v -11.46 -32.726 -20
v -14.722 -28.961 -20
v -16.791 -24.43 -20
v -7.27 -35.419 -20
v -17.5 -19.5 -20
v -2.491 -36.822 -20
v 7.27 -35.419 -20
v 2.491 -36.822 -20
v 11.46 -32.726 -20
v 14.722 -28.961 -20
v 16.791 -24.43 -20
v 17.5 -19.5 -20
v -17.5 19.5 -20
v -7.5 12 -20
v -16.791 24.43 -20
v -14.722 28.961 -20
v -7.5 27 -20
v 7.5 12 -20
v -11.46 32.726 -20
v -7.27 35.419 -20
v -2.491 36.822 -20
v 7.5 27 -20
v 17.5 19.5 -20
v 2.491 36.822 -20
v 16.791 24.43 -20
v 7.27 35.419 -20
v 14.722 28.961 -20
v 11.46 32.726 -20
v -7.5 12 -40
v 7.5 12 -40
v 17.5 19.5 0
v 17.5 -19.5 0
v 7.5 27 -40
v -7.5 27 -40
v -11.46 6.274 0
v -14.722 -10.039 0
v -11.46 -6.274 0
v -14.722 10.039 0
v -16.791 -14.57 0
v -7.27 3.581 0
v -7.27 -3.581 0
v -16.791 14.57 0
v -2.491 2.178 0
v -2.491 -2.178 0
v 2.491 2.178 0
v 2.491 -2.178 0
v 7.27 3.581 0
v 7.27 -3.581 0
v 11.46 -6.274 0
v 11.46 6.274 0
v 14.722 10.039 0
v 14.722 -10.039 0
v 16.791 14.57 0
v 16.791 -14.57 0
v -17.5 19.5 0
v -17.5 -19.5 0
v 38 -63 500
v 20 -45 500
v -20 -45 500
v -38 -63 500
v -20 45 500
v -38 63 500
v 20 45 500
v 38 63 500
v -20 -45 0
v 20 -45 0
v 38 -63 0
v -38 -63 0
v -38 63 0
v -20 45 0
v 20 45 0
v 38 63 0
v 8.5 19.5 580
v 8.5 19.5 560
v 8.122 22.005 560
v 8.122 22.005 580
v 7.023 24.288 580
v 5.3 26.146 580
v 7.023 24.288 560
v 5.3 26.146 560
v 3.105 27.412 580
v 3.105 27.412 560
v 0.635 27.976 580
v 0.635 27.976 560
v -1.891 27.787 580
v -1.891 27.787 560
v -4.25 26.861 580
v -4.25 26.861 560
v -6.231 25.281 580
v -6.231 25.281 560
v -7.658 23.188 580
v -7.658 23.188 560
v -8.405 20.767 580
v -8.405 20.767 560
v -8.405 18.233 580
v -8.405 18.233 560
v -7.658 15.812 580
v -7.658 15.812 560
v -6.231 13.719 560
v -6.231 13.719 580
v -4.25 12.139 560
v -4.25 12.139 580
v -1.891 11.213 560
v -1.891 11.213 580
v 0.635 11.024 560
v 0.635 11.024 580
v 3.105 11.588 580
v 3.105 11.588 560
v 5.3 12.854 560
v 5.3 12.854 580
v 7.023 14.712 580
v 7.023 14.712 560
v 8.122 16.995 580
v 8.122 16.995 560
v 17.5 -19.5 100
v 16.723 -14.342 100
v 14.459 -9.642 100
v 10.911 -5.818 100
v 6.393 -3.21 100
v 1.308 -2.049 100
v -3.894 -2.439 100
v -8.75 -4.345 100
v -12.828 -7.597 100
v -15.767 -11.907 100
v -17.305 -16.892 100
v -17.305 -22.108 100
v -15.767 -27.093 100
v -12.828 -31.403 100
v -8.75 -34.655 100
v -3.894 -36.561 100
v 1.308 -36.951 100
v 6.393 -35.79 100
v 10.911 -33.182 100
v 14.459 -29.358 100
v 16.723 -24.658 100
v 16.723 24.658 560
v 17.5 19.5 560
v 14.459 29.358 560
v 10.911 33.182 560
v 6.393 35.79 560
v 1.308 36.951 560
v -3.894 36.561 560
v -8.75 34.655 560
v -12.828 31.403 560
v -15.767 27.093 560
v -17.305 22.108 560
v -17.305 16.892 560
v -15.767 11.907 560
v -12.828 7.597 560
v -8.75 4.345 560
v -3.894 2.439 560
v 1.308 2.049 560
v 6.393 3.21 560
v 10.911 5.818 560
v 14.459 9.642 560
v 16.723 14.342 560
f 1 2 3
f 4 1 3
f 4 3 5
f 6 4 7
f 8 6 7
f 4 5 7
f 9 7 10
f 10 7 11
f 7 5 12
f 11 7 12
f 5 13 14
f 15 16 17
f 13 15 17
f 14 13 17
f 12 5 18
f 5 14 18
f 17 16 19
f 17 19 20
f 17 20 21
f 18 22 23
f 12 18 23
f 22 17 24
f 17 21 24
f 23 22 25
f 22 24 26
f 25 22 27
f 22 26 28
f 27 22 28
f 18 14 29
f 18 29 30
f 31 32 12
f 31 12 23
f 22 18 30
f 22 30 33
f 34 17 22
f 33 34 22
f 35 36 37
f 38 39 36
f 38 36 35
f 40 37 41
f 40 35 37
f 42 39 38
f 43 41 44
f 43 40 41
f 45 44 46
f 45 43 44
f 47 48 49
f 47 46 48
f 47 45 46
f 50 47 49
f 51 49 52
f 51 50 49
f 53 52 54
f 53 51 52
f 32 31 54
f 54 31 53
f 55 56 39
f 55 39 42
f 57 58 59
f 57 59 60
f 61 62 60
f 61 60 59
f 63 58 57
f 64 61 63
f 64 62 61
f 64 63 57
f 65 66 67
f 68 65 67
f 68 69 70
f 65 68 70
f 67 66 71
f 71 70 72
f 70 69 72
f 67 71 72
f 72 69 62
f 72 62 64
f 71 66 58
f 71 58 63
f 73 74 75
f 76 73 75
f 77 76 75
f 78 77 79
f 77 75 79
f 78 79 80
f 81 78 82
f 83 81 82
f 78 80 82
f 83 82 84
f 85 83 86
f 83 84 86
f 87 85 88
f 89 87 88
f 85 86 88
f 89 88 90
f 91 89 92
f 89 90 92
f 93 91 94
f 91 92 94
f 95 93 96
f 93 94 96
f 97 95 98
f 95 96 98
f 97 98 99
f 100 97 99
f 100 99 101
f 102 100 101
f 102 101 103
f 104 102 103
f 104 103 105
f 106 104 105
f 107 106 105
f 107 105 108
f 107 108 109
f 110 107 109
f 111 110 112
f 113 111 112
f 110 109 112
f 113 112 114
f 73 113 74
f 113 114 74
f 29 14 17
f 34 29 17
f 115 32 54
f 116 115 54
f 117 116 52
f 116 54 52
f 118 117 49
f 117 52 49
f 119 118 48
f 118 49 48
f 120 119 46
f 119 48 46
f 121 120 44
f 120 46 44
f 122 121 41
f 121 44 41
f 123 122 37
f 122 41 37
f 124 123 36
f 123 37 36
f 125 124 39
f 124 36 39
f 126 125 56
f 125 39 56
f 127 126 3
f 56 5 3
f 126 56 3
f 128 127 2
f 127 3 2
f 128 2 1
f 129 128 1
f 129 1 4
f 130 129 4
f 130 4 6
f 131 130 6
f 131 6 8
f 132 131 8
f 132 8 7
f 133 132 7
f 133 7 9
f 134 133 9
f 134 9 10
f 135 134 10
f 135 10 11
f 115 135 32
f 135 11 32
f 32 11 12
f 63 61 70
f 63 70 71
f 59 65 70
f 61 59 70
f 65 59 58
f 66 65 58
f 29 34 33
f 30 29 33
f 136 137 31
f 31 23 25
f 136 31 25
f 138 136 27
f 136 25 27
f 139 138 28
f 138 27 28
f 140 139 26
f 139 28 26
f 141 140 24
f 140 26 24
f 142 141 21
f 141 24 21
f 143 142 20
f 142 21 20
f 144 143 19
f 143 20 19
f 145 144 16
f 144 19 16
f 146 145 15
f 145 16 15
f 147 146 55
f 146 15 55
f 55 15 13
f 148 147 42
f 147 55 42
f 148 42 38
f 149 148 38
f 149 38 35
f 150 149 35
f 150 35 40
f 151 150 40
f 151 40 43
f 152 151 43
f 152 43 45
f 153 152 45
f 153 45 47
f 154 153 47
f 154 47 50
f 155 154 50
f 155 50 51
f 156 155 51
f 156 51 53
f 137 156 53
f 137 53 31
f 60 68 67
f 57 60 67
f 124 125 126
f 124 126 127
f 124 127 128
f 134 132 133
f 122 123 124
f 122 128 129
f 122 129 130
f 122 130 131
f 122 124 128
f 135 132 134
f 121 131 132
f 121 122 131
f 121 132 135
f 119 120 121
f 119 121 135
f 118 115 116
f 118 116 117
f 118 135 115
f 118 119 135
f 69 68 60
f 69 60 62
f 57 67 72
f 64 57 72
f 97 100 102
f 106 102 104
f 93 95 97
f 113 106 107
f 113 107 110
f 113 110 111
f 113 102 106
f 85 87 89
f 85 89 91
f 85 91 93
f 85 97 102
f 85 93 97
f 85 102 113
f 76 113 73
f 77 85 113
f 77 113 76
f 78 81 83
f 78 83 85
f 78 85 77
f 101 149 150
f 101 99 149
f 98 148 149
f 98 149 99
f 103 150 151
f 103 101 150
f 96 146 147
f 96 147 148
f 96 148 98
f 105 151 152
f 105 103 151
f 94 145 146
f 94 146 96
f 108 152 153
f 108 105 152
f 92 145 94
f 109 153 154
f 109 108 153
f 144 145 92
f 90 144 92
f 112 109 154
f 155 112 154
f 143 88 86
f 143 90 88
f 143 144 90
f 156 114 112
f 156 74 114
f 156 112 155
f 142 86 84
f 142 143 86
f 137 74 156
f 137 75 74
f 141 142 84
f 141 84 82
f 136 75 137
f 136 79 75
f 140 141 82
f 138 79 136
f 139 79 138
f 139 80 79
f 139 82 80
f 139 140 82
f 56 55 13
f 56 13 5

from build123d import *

# Parameters (mm, degrees)
F1_W     = 15
F1_H     = 15
F2_DEPTH = 20
F3_DEPTH = 100
F4_DEPTH = 560
F5_DEPTH = 40
F6_R     = 8.5
F7_DEPTH = 20
F0_W     = 76
F0_H     = 126
F0_W_2   = 40
F0_H_2   = 90
F8_DEPTH = 500


with BuildPart() as f2:
    # F1 (on Top) → F2 (new body)
    with BuildSketch(Plane.XY):
        with BuildLine():
            ThreePointArc((-17.5, -19.5), (0, -2), (17.5, -19.5))
            Line((17.5, -19.5), (17.5, 19.5))
            ThreePointArc((17.5, 19.5), (0, 2), (-17.5, 19.5))
            Line((-17.5, 19.5), (-17.5, -19.5))
        make_face()
        with BuildLine():
            ThreePointArc((-17.5, 19.5), (0, 2), (17.5, 19.5))
            ThreePointArc((17.5, 19.5), (0, 37), (-17.5, 19.5))
        make_face()
        with Locations((0, 19.5)):
            Rectangle(F1_W, F1_H, mode=Mode.SUBTRACT)
        with BuildLine():
            ThreePointArc((-17.5, -19.5), (0, -37), (17.5, -19.5))
            ThreePointArc((17.5, -19.5), (0, -2), (-17.5, -19.5))
        make_face()
        with Locations((0, 19.5)):
            Rectangle(F1_W, F1_H)
    extrude(amount=-F2_DEPTH)

    # F1 (on Top) → F3 (join)
    with BuildSketch(Plane.XY):
        with BuildLine():
            ThreePointArc((-17.5, -19.5), (0, -37), (17.5, -19.5))
            ThreePointArc((17.5, -19.5), (0, -2), (-17.5, -19.5))
        make_face()
    extrude(amount=F3_DEPTH)

    # F1 (on Top) → F4 (join)
    with BuildSketch(Plane.XY):
        with BuildLine():
            ThreePointArc((-17.5, 19.5), (0, 2), (17.5, 19.5))
            ThreePointArc((17.5, 19.5), (0, 37), (-17.5, 19.5))
        make_face()
        with Locations((0, 19.5)):
            Rectangle(F1_W, F1_H, mode=Mode.SUBTRACT)
        with Locations((0, 19.5)):
            Rectangle(F1_W, F1_H)
    extrude(amount=F4_DEPTH)

    # F1 (on Top) → F5 (join)
    with BuildSketch(Plane.XY):
        with Locations((0, 19.5)):
            Rectangle(F1_W, F1_H)
    extrude(amount=-F5_DEPTH)

    # F6 (on face) → F7 (join)
    with BuildSketch(Plane.XY.offset(560)):
        with Locations((0, 19.5)):
            Circle(F6_R)
    extrude(amount=F7_DEPTH)


with BuildPart() as f8:
    # F0 (on Top) → F8 (new body)
    with BuildSketch(Plane.XY):
        Rectangle(F0_W, F0_H)
        Rectangle(F0_W_2, F0_H_2, mode=Mode.SUBTRACT)
    extrude(amount=F8_DEPTH)


solid = Compound([f2.part, f8.part])
